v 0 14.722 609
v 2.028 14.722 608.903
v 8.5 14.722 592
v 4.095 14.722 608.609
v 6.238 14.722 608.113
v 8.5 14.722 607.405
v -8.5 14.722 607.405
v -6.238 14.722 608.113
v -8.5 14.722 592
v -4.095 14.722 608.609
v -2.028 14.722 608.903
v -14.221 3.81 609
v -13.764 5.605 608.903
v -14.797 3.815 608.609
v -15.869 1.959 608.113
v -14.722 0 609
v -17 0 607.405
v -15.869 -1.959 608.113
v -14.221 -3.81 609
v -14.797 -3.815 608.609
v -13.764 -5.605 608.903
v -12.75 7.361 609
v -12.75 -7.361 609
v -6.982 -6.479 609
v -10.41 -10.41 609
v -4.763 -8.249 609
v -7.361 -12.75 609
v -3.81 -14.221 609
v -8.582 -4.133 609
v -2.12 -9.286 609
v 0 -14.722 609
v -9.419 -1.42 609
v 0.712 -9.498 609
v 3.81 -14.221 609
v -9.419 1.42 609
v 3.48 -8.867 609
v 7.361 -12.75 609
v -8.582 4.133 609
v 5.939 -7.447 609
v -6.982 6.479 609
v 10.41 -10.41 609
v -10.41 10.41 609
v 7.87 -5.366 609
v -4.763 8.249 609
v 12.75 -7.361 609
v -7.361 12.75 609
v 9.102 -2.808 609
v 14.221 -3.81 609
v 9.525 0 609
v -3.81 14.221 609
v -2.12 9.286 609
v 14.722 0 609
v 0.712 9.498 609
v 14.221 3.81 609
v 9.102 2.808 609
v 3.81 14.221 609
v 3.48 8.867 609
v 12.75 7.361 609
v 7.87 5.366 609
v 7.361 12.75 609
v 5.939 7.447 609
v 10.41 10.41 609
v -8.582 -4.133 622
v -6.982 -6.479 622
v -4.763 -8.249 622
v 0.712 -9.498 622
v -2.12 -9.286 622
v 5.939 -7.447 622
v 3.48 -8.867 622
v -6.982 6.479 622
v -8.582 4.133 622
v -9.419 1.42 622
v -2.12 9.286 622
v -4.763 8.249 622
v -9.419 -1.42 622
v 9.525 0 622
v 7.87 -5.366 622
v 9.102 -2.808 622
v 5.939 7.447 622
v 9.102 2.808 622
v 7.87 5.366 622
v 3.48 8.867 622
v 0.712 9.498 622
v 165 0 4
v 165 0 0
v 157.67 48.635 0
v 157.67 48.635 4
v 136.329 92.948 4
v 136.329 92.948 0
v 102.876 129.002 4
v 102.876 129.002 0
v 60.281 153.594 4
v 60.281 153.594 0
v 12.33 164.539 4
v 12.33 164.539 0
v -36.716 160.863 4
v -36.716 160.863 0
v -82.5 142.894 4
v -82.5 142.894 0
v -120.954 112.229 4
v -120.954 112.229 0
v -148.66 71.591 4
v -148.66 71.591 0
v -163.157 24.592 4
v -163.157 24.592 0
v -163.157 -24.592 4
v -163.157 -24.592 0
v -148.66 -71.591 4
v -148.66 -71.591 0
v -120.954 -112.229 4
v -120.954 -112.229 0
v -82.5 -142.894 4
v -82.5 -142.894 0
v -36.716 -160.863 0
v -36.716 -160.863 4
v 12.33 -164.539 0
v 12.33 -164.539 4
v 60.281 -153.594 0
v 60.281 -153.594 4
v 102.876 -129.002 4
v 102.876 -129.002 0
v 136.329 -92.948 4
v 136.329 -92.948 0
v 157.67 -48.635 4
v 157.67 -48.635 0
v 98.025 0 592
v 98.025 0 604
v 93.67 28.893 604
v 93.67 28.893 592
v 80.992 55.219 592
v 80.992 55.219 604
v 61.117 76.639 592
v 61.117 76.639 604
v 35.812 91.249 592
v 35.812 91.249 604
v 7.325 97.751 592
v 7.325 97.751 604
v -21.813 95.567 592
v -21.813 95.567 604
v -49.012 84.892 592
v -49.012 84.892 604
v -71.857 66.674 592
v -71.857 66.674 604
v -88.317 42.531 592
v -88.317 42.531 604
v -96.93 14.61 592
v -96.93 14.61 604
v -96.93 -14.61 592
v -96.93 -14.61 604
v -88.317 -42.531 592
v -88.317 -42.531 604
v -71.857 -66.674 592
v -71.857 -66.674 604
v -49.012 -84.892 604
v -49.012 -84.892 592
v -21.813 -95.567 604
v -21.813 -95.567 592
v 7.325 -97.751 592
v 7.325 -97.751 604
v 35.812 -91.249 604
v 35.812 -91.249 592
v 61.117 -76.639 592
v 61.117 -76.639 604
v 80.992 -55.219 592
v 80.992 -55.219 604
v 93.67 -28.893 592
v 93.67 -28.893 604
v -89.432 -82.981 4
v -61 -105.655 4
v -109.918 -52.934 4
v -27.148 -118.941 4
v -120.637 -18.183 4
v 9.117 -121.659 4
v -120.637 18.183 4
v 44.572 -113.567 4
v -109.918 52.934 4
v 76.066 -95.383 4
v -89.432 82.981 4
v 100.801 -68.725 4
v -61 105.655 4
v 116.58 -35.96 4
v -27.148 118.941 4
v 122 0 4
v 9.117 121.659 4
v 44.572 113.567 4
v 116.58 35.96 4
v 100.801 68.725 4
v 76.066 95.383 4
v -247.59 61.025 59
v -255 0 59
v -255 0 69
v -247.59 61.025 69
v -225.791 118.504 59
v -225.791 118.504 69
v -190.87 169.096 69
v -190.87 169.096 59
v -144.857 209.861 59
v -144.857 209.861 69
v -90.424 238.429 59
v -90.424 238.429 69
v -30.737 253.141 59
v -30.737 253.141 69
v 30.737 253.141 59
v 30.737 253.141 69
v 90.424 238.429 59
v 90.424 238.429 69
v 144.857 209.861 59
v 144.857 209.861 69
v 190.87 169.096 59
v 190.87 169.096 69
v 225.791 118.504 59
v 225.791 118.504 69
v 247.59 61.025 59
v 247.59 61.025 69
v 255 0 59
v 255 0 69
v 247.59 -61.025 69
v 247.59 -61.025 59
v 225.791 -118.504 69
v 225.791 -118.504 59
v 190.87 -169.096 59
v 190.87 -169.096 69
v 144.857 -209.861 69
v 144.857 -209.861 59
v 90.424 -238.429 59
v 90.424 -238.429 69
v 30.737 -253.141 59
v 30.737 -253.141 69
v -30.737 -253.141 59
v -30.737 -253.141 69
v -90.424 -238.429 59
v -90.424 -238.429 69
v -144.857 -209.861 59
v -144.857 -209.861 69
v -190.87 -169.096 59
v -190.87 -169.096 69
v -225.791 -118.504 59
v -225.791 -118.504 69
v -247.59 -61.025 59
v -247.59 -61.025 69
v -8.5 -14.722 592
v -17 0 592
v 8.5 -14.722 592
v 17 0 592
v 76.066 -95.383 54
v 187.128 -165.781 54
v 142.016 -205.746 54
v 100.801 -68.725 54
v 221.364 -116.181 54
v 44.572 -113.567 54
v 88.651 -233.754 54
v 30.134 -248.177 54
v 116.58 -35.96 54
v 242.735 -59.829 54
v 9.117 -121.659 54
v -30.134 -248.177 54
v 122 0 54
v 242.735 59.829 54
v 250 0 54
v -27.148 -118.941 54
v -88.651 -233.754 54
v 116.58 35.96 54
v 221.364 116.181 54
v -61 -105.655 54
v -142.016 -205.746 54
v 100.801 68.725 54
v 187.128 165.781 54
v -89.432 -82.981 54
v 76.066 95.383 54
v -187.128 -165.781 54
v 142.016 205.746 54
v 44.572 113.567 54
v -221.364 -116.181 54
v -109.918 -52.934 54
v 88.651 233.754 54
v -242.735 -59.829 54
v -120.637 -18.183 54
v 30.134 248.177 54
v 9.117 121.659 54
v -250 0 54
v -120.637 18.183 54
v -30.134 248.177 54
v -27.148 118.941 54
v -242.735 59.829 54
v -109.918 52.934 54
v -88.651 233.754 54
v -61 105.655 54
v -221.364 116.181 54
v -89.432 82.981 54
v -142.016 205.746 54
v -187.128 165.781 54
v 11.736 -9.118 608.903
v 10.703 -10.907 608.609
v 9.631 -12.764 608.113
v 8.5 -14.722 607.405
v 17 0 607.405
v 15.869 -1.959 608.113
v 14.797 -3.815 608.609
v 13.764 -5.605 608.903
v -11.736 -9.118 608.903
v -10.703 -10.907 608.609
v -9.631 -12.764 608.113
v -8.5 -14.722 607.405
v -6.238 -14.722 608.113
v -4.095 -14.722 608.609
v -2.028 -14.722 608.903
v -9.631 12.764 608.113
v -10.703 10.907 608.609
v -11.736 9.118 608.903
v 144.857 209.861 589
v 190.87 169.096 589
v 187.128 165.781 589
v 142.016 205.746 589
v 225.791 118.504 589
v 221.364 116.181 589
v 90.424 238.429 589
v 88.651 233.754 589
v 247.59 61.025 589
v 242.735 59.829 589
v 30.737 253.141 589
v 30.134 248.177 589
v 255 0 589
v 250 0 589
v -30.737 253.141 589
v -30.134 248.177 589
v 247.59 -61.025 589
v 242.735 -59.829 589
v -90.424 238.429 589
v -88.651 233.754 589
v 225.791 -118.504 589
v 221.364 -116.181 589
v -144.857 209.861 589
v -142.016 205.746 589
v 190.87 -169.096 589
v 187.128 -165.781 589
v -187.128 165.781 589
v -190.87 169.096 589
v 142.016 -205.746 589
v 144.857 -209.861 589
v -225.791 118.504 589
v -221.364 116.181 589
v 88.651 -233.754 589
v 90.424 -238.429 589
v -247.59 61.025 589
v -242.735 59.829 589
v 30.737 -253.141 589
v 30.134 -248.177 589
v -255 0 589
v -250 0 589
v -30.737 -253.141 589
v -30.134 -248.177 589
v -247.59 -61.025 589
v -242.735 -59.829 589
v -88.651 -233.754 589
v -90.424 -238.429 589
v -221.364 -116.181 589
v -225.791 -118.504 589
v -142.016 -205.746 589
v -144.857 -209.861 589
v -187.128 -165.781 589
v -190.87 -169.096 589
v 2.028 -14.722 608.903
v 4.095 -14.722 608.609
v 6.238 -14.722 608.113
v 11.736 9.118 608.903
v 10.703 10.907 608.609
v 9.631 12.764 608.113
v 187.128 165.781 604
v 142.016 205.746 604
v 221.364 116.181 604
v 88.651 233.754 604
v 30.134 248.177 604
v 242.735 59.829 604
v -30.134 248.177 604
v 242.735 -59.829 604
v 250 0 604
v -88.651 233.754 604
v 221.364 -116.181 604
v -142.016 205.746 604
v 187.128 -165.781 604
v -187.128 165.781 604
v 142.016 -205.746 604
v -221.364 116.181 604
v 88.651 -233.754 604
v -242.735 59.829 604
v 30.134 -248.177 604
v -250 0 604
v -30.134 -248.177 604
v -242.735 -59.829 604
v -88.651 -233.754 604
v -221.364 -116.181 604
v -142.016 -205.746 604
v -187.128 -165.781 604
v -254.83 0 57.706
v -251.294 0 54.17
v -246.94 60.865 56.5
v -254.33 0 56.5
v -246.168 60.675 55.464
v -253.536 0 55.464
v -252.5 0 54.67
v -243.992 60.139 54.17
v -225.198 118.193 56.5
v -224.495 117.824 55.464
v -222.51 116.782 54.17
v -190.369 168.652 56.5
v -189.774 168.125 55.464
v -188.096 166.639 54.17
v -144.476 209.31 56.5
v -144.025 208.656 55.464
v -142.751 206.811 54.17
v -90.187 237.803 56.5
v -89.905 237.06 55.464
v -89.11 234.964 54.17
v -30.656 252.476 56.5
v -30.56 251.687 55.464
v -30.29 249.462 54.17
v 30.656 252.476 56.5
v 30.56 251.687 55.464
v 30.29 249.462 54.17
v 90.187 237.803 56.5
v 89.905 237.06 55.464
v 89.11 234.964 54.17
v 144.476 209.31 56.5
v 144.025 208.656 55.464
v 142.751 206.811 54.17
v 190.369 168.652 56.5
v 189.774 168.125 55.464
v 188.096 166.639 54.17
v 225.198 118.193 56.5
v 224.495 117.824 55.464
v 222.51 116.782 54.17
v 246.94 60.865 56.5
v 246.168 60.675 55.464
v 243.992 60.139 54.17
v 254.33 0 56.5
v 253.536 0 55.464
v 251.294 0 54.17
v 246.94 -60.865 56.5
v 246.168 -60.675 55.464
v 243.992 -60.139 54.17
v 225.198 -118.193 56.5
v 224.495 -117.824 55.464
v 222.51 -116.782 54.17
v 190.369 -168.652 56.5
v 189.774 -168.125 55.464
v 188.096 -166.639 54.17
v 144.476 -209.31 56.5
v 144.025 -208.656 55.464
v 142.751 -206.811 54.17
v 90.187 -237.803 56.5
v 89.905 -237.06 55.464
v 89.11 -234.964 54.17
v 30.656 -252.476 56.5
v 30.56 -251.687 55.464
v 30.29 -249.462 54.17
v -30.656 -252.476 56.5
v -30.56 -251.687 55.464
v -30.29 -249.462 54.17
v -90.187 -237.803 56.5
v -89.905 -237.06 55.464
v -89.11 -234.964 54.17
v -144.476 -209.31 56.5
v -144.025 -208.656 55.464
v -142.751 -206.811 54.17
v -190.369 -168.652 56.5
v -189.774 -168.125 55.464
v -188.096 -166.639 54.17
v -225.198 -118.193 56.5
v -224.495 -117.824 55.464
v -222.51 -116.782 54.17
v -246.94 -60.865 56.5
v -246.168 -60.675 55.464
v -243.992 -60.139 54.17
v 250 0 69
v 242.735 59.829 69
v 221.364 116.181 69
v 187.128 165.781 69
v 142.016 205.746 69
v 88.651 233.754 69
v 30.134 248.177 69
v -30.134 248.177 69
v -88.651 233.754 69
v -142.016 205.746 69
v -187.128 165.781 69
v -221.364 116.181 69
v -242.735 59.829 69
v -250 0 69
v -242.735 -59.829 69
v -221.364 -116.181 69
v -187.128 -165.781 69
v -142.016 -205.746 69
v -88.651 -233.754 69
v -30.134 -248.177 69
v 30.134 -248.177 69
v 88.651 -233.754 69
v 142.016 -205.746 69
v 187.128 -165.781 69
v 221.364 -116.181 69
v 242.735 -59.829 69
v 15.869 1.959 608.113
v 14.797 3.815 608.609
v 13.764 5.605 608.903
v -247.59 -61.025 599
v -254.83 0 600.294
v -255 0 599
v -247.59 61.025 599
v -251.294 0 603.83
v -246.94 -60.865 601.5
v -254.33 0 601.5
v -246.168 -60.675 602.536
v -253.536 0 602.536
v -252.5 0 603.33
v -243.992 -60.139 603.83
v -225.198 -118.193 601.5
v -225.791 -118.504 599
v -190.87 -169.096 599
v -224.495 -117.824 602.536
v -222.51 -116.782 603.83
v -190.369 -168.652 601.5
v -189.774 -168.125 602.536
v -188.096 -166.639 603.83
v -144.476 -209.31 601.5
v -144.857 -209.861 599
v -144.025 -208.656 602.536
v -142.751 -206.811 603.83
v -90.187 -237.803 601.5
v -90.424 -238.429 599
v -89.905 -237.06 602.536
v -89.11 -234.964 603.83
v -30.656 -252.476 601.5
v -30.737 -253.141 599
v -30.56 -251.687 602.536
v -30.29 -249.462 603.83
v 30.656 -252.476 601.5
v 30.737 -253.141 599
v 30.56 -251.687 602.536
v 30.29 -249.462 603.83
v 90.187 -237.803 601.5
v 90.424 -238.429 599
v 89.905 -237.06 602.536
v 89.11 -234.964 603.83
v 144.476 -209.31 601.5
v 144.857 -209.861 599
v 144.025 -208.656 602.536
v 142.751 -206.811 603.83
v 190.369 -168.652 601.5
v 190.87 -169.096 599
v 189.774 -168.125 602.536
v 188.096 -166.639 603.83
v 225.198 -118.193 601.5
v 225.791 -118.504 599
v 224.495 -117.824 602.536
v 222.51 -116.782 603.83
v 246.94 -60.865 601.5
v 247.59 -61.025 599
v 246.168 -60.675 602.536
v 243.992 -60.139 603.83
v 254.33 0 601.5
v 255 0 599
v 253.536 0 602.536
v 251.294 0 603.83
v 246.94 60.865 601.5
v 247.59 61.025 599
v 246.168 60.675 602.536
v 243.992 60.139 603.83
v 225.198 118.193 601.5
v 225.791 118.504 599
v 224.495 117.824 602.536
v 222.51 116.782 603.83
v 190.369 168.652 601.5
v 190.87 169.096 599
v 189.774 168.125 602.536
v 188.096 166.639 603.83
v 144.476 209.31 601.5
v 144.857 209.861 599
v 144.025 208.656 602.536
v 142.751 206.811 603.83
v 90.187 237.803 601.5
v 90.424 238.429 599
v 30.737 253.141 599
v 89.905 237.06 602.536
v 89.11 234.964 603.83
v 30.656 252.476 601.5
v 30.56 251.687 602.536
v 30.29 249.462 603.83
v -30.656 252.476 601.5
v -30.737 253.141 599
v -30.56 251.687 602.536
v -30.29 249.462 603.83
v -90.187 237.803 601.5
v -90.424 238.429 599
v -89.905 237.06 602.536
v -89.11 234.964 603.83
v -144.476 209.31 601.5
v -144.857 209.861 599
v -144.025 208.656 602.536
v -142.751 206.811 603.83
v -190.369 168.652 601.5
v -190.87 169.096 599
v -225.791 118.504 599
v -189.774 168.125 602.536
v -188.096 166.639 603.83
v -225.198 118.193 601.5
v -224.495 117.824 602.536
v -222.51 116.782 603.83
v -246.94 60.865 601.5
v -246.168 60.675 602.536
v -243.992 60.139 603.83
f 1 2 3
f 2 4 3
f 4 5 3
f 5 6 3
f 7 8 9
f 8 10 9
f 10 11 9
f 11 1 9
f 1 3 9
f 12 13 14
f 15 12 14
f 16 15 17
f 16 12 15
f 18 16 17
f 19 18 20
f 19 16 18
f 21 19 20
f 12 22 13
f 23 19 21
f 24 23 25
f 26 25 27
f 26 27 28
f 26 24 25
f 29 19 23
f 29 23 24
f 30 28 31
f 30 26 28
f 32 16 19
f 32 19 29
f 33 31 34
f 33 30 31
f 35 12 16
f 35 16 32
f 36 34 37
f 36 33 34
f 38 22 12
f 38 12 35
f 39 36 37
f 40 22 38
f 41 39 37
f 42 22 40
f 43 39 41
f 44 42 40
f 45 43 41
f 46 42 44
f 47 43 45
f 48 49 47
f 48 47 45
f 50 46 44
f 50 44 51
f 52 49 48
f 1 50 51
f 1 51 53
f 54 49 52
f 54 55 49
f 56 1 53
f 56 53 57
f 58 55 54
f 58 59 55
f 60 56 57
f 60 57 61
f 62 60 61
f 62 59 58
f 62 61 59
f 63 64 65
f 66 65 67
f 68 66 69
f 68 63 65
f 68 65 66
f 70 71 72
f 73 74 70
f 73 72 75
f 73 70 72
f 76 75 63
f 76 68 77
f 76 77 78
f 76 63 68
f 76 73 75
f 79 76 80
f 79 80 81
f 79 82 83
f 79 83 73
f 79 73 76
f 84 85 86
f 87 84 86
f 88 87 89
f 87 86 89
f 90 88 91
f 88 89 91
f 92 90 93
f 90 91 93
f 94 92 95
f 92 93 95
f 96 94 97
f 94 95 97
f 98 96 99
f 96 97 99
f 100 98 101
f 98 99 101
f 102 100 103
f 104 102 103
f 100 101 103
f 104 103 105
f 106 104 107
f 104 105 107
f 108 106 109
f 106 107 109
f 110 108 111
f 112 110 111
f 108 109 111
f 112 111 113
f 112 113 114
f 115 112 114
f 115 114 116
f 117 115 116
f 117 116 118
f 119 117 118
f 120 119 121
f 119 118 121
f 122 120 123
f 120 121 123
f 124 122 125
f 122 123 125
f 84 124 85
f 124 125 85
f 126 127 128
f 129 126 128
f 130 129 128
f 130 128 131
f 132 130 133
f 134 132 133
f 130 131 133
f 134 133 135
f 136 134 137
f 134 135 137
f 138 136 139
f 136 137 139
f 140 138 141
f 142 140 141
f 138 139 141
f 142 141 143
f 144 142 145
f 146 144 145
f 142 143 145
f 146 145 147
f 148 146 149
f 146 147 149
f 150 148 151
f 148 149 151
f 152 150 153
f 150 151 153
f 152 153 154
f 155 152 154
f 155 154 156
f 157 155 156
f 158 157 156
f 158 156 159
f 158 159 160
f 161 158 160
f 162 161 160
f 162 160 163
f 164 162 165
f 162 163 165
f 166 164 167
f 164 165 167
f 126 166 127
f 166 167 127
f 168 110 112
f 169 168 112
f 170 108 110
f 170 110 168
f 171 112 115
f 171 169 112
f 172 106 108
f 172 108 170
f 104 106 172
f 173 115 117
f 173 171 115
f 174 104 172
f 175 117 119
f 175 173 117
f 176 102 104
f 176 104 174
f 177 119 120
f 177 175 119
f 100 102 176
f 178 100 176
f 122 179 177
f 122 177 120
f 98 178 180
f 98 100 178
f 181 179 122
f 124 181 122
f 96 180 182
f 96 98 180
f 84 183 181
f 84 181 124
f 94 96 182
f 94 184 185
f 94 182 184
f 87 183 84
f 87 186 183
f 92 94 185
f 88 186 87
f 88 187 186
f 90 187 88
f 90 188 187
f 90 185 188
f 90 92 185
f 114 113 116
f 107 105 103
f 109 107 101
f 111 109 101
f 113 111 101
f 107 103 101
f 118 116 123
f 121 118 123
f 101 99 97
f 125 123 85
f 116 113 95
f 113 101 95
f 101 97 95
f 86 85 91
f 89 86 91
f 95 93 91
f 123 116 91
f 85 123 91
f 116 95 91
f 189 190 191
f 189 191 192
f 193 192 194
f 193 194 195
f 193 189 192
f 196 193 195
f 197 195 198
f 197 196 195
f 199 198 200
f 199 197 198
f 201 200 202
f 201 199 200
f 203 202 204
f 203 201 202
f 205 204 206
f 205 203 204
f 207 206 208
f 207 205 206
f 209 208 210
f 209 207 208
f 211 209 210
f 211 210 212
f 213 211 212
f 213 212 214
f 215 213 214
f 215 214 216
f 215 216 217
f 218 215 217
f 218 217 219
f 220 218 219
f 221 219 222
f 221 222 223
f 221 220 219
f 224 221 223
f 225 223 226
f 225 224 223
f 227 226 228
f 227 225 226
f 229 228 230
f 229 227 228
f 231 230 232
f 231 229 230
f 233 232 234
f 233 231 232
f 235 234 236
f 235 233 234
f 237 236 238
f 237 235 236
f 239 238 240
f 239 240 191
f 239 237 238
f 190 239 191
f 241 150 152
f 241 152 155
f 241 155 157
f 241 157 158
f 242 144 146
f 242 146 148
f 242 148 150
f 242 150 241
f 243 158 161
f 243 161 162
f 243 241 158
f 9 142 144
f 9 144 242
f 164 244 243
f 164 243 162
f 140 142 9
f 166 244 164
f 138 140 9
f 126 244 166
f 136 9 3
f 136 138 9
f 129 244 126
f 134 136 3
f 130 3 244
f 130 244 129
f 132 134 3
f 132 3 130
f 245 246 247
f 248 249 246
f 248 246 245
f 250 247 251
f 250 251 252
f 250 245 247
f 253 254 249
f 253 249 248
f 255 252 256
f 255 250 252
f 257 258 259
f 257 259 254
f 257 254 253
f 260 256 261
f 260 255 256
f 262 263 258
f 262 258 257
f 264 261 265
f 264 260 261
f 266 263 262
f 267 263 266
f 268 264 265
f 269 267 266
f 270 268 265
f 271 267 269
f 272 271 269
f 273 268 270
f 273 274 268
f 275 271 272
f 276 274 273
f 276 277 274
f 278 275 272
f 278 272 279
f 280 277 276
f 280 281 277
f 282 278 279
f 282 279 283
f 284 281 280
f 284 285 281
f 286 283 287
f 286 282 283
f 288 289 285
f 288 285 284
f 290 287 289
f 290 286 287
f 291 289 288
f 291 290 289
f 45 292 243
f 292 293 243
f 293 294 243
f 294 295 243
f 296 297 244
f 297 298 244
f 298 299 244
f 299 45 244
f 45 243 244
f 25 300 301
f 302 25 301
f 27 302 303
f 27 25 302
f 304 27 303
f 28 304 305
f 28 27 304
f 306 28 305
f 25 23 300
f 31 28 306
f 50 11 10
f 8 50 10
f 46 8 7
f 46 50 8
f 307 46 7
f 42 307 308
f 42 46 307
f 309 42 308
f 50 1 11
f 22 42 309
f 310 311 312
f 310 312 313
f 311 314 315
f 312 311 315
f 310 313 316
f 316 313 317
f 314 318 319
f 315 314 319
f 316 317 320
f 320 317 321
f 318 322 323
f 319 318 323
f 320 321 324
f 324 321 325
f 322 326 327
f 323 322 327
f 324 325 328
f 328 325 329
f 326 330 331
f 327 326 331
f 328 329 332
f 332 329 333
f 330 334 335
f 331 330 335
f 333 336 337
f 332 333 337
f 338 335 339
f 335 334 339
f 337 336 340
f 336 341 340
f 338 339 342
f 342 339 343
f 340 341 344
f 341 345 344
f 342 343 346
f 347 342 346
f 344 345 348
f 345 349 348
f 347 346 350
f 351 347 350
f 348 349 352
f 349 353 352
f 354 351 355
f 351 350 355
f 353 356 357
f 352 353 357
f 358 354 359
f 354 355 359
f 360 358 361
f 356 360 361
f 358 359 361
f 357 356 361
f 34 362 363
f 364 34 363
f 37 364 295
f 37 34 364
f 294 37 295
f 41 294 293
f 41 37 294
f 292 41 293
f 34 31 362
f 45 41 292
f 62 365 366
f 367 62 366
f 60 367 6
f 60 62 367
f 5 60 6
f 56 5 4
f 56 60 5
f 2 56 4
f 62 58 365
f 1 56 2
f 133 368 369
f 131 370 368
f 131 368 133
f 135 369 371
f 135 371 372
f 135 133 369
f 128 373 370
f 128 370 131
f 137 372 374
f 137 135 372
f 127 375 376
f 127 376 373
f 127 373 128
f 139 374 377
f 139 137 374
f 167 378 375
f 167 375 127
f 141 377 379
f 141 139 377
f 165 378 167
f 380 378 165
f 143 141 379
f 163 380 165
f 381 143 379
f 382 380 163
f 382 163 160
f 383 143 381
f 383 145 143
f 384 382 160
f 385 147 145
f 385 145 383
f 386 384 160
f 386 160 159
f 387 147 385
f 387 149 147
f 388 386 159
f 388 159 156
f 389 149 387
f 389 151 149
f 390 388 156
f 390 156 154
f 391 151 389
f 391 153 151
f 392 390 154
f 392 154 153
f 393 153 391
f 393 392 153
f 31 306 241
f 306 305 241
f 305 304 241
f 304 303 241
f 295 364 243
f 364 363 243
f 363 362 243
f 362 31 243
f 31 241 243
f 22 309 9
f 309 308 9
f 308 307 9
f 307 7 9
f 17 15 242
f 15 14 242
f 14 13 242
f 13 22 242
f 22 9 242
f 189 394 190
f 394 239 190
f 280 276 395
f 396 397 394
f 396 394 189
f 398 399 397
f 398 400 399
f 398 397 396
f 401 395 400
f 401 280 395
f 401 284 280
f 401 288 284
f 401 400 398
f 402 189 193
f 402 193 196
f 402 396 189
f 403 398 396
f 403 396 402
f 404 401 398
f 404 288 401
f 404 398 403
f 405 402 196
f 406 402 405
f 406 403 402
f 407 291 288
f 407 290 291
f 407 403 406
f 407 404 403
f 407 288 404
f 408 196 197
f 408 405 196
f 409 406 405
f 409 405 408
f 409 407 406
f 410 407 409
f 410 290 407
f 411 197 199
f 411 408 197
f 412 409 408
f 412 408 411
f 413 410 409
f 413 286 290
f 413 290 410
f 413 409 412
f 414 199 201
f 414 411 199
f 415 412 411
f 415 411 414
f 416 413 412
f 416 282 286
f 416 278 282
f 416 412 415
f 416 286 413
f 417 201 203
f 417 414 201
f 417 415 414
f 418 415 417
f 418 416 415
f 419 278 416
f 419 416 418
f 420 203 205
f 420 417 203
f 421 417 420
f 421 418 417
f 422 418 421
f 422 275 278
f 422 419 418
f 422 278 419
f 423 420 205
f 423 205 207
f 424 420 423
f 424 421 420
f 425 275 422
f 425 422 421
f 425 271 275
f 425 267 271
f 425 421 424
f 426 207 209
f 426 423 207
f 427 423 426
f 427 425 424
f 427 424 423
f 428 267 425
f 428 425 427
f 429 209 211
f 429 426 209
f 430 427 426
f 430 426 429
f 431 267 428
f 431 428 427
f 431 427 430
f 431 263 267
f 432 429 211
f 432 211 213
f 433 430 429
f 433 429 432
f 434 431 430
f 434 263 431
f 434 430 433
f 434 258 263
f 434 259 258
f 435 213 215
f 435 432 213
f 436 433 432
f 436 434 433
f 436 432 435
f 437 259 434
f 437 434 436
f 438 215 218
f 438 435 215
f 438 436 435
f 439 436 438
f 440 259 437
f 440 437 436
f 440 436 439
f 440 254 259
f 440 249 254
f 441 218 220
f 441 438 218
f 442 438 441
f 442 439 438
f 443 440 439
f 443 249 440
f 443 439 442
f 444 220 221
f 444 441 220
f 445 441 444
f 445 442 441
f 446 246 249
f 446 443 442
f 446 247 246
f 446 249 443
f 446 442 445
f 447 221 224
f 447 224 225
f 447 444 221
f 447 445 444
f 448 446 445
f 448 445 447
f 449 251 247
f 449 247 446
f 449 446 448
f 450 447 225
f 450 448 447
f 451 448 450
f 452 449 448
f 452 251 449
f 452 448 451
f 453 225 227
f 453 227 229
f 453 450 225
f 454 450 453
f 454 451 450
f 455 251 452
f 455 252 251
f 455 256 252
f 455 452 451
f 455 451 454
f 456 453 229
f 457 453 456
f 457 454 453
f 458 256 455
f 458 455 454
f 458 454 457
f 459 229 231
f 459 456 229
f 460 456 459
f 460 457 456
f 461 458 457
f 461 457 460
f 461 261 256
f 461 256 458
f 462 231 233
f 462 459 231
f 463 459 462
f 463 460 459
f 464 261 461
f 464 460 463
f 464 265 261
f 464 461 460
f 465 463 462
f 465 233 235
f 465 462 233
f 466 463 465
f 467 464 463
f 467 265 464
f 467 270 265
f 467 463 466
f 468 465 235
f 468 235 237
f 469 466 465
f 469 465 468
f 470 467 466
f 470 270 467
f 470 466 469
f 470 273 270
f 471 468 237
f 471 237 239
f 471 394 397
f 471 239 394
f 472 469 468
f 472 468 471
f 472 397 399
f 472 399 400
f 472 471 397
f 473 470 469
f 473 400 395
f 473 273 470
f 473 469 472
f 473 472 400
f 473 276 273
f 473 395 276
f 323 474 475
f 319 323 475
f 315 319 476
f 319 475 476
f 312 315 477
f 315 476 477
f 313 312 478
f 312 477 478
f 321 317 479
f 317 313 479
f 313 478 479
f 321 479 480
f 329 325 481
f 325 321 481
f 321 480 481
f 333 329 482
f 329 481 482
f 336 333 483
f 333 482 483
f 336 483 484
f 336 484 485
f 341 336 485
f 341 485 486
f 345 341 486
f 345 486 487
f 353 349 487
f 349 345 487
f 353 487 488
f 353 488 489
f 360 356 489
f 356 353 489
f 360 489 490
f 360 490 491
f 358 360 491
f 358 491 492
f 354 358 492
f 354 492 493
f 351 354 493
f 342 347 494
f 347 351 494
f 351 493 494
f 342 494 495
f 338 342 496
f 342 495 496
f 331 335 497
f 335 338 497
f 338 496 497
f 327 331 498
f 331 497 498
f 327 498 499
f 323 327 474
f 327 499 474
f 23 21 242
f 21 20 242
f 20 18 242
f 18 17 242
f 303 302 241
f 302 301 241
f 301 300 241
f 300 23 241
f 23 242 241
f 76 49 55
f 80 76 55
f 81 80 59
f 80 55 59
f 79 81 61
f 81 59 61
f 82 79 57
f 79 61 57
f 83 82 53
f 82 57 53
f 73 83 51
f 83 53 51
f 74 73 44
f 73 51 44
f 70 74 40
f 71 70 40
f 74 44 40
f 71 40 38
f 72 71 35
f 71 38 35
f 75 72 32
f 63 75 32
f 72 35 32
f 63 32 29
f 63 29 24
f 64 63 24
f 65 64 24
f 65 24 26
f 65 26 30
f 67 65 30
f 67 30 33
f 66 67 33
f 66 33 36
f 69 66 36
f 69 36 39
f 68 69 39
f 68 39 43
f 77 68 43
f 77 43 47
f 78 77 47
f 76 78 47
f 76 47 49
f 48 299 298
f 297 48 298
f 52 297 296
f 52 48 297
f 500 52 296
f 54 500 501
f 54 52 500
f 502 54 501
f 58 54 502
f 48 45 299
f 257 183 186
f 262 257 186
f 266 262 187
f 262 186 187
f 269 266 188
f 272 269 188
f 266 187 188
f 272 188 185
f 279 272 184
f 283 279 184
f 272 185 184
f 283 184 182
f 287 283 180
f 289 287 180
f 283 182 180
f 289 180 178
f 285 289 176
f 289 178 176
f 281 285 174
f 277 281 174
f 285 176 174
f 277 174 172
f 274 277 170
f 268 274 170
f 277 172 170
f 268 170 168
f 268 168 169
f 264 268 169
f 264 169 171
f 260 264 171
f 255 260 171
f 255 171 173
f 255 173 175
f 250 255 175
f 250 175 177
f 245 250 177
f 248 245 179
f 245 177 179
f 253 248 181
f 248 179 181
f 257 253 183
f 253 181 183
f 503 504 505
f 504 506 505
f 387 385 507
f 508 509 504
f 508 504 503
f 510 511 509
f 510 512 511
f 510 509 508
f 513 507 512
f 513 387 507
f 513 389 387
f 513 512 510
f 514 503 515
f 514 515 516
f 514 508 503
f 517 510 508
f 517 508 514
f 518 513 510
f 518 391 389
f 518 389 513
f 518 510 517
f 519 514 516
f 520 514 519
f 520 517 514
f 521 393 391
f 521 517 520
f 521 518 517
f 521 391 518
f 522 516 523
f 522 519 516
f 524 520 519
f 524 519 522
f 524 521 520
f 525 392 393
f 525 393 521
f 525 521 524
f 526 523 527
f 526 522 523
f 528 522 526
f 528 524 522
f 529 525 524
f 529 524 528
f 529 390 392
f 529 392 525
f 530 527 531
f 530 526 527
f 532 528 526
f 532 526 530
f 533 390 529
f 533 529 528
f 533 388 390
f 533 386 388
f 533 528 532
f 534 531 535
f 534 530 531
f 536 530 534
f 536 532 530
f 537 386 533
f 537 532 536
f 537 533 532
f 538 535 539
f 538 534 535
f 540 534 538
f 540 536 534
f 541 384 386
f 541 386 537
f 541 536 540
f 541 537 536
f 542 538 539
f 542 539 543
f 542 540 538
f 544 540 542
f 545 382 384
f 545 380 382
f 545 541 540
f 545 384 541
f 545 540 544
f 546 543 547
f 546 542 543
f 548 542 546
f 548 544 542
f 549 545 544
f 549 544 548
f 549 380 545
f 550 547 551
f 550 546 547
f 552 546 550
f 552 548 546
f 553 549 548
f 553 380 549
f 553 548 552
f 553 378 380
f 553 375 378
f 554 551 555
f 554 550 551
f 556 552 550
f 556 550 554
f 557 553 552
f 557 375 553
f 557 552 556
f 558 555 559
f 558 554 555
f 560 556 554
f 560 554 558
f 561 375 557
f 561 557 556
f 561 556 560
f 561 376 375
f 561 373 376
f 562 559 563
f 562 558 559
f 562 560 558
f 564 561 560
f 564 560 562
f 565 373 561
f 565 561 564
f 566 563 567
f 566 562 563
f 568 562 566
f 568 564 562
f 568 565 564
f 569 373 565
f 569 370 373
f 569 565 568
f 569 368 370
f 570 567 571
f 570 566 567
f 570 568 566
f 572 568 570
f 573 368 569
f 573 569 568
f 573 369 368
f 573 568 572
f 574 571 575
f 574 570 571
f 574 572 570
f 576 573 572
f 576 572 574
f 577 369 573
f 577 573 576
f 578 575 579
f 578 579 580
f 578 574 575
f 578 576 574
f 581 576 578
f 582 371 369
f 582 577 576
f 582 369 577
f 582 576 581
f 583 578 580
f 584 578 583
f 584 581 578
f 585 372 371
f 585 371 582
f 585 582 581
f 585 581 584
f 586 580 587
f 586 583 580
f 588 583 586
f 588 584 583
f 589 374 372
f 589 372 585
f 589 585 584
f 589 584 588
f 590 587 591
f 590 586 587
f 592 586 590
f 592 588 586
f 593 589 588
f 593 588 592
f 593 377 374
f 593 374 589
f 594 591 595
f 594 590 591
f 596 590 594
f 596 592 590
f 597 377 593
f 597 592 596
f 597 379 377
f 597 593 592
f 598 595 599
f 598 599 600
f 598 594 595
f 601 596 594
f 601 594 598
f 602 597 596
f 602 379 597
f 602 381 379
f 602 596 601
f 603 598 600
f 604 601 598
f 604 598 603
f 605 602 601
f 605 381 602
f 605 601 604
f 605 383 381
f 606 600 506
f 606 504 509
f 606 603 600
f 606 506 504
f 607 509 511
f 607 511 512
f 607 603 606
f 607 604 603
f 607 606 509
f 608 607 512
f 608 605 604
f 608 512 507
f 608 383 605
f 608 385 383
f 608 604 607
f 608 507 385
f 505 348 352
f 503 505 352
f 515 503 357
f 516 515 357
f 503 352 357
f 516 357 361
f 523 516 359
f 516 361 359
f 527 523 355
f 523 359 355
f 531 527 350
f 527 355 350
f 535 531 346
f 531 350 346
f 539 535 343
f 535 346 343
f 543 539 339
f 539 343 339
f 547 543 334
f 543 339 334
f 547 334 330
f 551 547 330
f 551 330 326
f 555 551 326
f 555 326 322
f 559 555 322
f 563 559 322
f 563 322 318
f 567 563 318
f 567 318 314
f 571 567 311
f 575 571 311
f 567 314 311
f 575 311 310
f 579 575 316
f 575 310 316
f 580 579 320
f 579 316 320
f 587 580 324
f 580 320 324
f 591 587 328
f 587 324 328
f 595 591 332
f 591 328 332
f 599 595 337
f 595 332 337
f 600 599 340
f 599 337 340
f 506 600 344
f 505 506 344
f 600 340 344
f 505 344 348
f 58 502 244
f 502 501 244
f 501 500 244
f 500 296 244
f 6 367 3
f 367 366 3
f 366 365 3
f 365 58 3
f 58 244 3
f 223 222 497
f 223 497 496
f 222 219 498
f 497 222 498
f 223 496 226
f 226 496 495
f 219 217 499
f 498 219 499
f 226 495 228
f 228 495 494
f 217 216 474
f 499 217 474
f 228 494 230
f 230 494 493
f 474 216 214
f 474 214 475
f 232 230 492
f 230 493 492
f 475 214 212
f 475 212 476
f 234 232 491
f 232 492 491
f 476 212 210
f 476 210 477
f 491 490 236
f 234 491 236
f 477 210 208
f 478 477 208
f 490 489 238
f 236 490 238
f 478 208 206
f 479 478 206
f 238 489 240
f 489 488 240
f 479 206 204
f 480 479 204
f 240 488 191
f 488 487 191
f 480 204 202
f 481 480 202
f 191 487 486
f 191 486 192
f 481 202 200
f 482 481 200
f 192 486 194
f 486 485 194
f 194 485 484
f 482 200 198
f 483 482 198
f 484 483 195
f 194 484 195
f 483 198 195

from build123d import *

# Parameters (mm, degrees)
CROQUIS1_R              = 165
SALIENTE_EXTRUIR1_DEPTH = 4
CROQUIS2_R              = 122
SALIENTE_EXTRUIR2_DEPTH = 50
CROQUIS3_R              = 250
SALIENTE_EXTRUIR3_DEPTH = 550
CROQUIS4_R              = 255
SALIENTE_EXTRUIR4_DEPTH = 15
SALIENTE_EXTRUIR5_START = -15
CROQUIS5_R              = 255
SALIENTE_EXTRUIR5_DEPTH = 15
REDONDEO1_R             = 5
CROQUIS6_R              = 98.024692722
CORTAR_EXTRUIR1_DEPTH   = 12
CROQUIS7_R              = 9.525
SALIENTE_EXTRUIR6_DEPTH = 30
SALIENTE_EXTRUIR7_DEPTH = 17
CROQUIS9_R              = 43.133819065
CROQUIS9_R_2            = 14.722431864
CORTAR_EXTRUIR2_DEPTH   = 10
CORTAR_EXTRUIR2_DRAFT   = -55


with BuildPart() as part:
    # Croquis1 → Saliente-Extruir1 (new body)
    with BuildSketch(Plane.XY):
        Circle(CROQUIS1_R)
    extrude(amount=SALIENTE_EXTRUIR1_DEPTH)

    # Croquis2 → Saliente-Extruir2 (add)
    with BuildSketch(Plane.XY.offset(4)):
        Circle(CROQUIS2_R)
    extrude(amount=SALIENTE_EXTRUIR2_DEPTH)

    # Croquis3 → Saliente-Extruir3 (add)
    with BuildSketch(Plane.XY.offset(54)):
        Circle(CROQUIS3_R)
    extrude(amount=SALIENTE_EXTRUIR3_DEPTH)

    # Croquis4 → Saliente-Extruir4 (add)
    with BuildSketch(Plane(origin=(0, 0, 54), x_dir=(-1, 0, 0), z_dir=(0, 0, -1))):
        Circle(CROQUIS4_R)
    extrude(amount=-SALIENTE_EXTRUIR4_DEPTH)

    # Croquis5 → Saliente-Extruir5 (add)
    with BuildSketch(Plane.XY.offset(604).offset(SALIENTE_EXTRUIR5_START)):
        with Locations(Location((0, 0, 0), (0, 0, 180))):
            Circle(CROQUIS5_R)
    extrude(amount=SALIENTE_EXTRUIR5_DEPTH)

    # Redondeo1
    redondeo1_edges = [part.edges().sort_by_distance(p)[0] for p in [
        (255, 0, 54),
        (255, 0, 604),
    ]]
    fillet(redondeo1_edges, radius=REDONDEO1_R)

    # Croquis6 → Cortar-Extruir1 (cut)
    with BuildSketch(Plane.XY.offset(604)):
        Circle(CROQUIS6_R)
    extrude(amount=-CORTAR_EXTRUIR1_DEPTH, mode=Mode.SUBTRACT)

    # Croquis7 → Saliente-Extruir6 (add)
    with BuildSketch(Plane.XY.offset(592)):
        Circle(CROQUIS7_R)
    extrude(amount=SALIENTE_EXTRUIR6_DEPTH)

    # Croquis8 → Saliente-Extruir7 (add)
    with BuildSketch(Plane.XY.offset(592)):
        Polygon((17, 0), (8.5, 14.722431864), (-8.5, 14.722431864), (-17, 0), (-8.5, -14.722431864), (8.5, -14.722431864), align=None)
    extrude(amount=SALIENTE_EXTRUIR7_DEPTH)


with BuildPart() as cortar_extruir2_tool:
    # Croquis9 → Cortar-Extruir2 (with draft: the straight prism first)
    with BuildSketch(Plane.XY.offset(609)):
        Circle(CROQUIS9_R)
        Circle(CROQUIS9_R_2, mode=Mode.SUBTRACT)
    extrude(amount=-CORTAR_EXTRUIR2_DEPTH)
    # Cortar-Extruir2: the draft: its side faces are tilted about the plane it starts from
    cortar_extruir2_sides = [cortar_extruir2_tool.faces().sort_by_distance(p)[0] for p in [
        (-43.133819065, 0, 604),
        (-14.722431864, 0, 604),
    ]]
    draft(cortar_extruir2_sides, Plane.XY.offset(609), CORTAR_EXTRUIR2_DRAFT)


with BuildPart() as part_1:
    add(part.part)

    # Cortar-Extruir2: cut by cortar_extruir2_tool
    add(cortar_extruir2_tool.part, mode=Mode.SUBTRACT)


solid = part_1.part
